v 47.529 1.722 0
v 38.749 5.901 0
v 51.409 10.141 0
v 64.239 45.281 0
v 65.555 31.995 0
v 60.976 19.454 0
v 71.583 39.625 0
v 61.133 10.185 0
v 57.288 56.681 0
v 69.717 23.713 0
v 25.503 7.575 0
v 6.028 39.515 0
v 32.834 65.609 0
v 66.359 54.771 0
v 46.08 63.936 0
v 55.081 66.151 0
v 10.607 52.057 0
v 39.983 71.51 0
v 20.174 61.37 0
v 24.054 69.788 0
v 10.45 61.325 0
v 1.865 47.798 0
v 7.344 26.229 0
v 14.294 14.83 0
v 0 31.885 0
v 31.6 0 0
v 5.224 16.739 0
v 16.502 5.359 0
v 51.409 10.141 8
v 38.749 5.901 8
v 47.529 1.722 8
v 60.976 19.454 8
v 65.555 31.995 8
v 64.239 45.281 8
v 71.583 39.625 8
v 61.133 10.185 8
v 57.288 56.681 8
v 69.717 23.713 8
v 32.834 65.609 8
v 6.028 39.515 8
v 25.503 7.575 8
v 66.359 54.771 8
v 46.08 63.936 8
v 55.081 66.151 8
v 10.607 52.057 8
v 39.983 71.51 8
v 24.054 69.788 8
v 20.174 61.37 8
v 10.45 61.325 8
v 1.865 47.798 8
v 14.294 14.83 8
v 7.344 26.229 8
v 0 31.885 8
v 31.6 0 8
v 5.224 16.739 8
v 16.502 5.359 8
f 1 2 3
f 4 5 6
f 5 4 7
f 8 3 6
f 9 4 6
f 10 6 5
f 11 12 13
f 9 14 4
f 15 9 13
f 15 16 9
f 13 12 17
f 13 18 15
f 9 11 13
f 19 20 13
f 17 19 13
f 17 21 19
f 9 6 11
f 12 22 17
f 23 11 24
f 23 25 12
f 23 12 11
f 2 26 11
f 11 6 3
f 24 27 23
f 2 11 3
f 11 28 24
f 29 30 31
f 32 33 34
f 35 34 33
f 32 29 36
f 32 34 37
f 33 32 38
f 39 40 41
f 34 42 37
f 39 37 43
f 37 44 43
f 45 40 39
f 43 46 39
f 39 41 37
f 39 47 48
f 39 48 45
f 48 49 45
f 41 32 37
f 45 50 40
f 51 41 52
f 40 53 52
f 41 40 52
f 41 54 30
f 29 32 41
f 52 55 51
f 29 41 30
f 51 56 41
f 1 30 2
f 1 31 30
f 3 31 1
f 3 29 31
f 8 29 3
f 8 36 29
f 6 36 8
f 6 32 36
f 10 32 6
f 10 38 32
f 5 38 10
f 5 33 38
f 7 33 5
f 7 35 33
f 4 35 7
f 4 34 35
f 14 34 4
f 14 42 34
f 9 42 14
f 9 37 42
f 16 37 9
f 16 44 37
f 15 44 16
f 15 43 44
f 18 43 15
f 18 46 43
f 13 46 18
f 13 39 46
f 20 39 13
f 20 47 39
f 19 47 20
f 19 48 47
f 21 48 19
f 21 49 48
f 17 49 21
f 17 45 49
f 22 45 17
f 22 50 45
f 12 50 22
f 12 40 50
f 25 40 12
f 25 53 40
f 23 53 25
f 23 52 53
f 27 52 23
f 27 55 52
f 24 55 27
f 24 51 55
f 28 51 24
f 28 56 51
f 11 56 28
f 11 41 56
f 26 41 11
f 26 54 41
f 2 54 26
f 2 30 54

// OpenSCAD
$fn = 32;

// ----------------------------------------------------------------------
// Chain sprocket: 14 teeth, 30 mm root radius
// ----------------------------------------------------------------------

// --- parameters (mm) ---
profile_height = 8;       // extrusion height
profile_points = 28;      // points of the closed outline

profile = [[65.555, 31.995], [71.583, 39.625], [64.239, 45.281], [66.359, 54.771], [57.288, 56.681], [55.081, 66.151], [46.08, 63.936], [39.983, 71.51], [32.834, 65.609], [24.054, 69.788], [20.174, 61.37], [10.45, 61.325], [10.607, 52.057], [1.865, 47.798], [6.028, 39.515], [0, 31.885], [7.344, 26.229], [5.224, 16.739], [14.294, 14.83], [16.502, 5.359], [25.503, 7.575], [31.6, 0], [38.749, 5.901], [47.529, 1.722], [51.409, 10.141], [61.133, 10.185], [60.976, 19.454], [69.717, 23.713]];  // single closed polygon, 28 points, counter clockwise

// --- the one profile operation ---
linear_extrude(height = profile_height) polygon(points = profile);
